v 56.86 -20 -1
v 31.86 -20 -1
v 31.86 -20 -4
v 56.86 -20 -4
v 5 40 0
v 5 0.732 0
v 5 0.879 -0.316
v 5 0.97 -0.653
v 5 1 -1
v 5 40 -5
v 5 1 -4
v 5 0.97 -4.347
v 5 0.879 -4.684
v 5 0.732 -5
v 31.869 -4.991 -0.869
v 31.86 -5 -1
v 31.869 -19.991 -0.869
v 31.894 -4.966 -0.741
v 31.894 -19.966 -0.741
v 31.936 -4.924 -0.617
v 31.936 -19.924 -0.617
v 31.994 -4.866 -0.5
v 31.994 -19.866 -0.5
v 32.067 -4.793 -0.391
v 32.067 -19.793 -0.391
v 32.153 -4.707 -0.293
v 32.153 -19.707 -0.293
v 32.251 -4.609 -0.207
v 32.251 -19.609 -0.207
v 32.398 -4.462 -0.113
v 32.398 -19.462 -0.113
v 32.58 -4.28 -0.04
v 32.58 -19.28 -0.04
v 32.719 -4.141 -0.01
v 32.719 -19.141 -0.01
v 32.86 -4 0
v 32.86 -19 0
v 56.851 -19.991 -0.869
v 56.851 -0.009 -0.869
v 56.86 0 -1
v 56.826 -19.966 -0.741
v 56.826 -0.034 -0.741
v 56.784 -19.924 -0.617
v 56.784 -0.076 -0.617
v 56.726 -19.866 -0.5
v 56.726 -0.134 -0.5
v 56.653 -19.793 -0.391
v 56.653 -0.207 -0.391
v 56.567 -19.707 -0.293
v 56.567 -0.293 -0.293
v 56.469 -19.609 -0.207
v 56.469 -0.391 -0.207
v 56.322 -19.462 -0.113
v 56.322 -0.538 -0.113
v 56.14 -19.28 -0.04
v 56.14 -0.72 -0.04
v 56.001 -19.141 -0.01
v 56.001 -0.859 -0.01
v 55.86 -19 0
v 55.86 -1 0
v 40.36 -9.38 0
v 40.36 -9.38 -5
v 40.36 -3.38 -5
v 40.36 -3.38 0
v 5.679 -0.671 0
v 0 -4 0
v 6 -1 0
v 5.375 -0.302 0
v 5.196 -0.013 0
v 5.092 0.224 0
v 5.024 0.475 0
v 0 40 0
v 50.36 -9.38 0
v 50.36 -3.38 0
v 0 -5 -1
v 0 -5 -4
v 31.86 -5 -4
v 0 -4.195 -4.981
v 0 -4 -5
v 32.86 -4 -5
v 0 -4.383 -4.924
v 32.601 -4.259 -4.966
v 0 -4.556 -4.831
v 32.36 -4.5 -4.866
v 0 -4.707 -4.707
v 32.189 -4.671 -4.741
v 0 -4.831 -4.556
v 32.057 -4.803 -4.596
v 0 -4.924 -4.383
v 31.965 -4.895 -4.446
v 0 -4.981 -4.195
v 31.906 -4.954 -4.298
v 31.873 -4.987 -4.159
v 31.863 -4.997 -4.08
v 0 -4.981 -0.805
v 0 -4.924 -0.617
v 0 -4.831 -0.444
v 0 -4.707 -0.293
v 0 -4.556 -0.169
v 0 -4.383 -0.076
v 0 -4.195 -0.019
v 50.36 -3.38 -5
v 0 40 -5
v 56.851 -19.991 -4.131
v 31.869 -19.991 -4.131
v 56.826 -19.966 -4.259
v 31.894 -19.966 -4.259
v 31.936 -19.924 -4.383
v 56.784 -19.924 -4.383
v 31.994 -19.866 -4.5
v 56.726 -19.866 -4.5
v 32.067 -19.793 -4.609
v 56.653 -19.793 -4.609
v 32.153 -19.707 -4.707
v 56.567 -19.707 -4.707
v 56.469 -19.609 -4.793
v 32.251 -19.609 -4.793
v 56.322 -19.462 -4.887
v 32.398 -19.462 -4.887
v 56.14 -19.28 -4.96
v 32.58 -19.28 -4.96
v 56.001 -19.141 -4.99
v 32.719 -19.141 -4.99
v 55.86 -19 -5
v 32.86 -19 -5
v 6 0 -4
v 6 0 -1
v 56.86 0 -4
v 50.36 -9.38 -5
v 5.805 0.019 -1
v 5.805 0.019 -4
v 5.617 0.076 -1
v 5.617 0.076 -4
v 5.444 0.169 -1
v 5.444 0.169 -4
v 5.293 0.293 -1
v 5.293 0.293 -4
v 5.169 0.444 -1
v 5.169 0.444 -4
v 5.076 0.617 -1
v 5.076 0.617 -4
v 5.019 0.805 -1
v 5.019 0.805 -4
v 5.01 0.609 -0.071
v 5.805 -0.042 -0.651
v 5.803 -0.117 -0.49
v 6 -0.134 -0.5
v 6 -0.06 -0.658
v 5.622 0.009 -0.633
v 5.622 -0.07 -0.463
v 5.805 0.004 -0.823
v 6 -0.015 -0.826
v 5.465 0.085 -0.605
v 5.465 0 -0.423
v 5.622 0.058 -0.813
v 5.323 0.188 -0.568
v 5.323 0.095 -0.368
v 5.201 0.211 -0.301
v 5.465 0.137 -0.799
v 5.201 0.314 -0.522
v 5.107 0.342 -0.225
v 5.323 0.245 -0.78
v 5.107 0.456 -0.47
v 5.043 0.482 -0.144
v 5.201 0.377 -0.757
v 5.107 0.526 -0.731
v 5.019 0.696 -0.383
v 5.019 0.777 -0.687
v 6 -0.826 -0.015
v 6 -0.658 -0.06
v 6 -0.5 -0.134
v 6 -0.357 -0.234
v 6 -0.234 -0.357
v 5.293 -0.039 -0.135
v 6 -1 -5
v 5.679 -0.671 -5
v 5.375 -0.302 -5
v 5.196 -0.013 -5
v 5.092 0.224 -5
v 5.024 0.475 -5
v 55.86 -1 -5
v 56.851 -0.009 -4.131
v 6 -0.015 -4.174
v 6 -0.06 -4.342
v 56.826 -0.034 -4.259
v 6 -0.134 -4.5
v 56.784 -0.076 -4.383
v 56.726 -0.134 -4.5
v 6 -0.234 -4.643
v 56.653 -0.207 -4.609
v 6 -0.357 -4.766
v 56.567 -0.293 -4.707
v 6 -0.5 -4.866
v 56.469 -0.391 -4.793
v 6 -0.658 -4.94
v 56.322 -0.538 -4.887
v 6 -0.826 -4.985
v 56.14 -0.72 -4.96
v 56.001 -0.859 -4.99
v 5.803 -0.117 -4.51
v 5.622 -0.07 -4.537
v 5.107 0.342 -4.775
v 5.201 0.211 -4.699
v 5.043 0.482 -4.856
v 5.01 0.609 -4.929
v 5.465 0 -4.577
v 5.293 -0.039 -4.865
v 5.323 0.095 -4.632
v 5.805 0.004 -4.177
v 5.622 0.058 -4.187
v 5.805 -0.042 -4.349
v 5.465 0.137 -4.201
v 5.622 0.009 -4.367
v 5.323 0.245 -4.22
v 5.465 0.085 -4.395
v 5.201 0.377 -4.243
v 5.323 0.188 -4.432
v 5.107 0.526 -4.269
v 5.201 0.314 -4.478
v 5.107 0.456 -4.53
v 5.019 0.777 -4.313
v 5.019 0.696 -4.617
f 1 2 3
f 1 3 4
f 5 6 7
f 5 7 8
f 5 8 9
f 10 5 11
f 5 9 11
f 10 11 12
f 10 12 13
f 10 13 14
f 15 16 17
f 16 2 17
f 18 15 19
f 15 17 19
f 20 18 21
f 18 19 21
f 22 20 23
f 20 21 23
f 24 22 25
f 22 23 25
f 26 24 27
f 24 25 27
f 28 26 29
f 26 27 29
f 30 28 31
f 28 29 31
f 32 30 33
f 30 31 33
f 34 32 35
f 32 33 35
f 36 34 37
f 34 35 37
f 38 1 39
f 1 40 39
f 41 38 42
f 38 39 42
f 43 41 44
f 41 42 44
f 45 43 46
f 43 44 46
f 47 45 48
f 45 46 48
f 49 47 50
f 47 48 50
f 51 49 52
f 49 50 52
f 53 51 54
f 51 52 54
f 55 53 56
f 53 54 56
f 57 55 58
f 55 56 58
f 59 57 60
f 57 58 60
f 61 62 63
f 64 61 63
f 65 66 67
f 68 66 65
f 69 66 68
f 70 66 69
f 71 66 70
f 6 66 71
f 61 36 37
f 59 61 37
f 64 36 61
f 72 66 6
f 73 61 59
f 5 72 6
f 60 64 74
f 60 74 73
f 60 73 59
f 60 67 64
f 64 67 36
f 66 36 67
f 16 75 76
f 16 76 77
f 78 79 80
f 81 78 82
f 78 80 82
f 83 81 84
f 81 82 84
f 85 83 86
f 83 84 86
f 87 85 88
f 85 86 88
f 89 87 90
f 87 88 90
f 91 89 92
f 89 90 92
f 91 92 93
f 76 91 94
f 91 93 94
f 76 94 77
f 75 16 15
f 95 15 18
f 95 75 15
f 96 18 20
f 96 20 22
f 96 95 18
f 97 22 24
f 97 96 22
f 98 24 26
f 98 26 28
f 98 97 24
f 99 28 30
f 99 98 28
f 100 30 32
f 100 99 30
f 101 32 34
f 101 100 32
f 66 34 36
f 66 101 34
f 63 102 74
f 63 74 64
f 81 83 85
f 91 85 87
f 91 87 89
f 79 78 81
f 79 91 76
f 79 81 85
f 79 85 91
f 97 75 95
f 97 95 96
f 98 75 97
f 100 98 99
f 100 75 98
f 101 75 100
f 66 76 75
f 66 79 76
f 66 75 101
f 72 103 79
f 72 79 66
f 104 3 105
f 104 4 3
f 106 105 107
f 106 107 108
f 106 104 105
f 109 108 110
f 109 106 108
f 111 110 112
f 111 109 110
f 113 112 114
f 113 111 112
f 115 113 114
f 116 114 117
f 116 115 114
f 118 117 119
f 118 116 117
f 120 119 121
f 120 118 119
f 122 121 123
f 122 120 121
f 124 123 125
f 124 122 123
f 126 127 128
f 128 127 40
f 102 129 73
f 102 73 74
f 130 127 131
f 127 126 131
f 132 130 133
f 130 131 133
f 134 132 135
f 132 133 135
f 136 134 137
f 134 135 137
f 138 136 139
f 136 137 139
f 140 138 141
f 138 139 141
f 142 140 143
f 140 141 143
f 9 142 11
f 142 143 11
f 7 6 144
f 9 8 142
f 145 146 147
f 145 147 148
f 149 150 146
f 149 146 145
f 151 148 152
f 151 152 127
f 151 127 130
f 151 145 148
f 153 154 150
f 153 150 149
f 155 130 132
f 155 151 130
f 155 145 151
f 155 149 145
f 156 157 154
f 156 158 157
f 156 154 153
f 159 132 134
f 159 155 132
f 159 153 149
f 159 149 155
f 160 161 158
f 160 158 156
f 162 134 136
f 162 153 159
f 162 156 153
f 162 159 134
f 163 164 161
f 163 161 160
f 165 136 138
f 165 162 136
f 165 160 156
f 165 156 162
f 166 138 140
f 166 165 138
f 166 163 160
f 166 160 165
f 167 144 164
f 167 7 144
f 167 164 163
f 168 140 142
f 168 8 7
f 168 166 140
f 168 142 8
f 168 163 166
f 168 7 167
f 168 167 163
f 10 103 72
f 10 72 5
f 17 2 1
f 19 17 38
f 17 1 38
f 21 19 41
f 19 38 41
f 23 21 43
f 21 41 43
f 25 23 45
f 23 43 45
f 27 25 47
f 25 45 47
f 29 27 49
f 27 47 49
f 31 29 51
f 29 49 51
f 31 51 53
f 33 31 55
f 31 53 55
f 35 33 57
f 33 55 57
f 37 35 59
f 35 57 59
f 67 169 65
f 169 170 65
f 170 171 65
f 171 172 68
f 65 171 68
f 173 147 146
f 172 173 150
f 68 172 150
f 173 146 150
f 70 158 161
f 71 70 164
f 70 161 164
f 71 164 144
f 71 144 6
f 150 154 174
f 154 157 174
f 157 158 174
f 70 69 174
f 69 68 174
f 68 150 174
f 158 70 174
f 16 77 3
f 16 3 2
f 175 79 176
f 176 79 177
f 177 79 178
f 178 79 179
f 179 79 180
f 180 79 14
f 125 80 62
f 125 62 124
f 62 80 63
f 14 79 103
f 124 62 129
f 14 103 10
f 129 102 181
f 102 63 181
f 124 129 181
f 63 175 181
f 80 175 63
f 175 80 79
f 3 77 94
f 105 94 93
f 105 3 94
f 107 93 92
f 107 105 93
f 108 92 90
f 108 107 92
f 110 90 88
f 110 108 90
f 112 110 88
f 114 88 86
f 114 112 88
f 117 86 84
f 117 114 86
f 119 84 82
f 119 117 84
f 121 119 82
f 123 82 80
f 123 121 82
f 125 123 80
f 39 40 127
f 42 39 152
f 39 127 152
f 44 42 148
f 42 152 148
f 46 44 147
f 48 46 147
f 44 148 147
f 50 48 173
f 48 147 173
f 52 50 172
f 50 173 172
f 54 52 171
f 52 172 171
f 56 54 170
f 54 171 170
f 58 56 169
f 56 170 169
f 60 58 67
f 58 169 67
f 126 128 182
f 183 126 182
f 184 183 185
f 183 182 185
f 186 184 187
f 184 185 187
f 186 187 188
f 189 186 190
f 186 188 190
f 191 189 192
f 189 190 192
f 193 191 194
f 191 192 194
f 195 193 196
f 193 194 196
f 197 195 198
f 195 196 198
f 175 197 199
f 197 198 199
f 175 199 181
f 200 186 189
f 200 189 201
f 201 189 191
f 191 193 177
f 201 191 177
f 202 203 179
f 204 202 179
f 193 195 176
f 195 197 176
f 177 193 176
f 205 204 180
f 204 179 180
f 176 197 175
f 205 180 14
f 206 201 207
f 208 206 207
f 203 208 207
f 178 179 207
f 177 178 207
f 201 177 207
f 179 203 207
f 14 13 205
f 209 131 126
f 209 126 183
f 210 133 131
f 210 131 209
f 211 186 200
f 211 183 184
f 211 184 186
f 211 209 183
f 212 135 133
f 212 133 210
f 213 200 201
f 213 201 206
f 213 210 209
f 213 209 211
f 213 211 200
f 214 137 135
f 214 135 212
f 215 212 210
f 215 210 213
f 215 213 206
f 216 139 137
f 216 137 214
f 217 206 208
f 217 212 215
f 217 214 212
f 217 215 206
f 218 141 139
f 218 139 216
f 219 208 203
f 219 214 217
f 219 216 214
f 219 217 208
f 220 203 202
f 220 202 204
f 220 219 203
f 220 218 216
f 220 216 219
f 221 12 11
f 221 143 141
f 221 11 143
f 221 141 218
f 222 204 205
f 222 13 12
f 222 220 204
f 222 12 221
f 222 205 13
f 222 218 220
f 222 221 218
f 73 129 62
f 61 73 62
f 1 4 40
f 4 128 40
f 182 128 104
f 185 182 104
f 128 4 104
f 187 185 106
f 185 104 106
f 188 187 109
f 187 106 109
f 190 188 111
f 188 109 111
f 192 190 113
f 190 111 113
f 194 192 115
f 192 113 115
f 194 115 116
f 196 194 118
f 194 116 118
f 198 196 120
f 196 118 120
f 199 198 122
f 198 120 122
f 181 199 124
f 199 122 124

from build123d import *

# Parameters (mm, degrees)
SKETCH1_W           = 5
SKETCH1_H           = 5
BOSS_EXTRUDE1_DEPTH = 40
SKETCH2_W           = 51.86
SKETCH2_H           = 5
SKETCH2_W_2         = 5
BOSS_EXTRUDE3_DEPTH = 5
SKETCH4_W           = 25
SKETCH4_H           = 5
BOSS_EXTRUDE4_DEPTH = 15
FILLET1_R           = 1
FILLET2_R           = 1
FILLET3_R           = 1
SKETCH5_W           = 10
SKETCH5_H           = 6
CUT_EXTRUDE1_DEPTH  = 70.699782068


with BuildPart() as part:
    # Sketch1 → Boss-Extrude1 (new body)
    with BuildSketch(Plane(origin=(0, 0, 0), x_dir=(1, 0, 0), z_dir=(0, 1, 0))):
        with Locations((2.5, 2.5)):
            Rectangle(SKETCH1_W, SKETCH1_H)
    extrude(amount=BOSS_EXTRUDE1_DEPTH)

    # Sketch2 → Boss-Extrude3 (add)
    with BuildSketch(Plane.XZ):
        with Locations((30.93, -2.5)):
            Rectangle(SKETCH2_W, SKETCH2_H)
        with Locations((2.5, -2.5)):
            Rectangle(SKETCH2_W_2, SKETCH2_H)
    extrude(amount=BOSS_EXTRUDE3_DEPTH)

    # Sketch4 → Boss-Extrude4 (add)
    with BuildSketch(Plane.XZ.offset(5)):
        with Locations((44.36, -2.5)):
            Rectangle(SKETCH4_W, SKETCH4_H)
    extrude(amount=BOSS_EXTRUDE4_DEPTH)

    # Fillet1
    fillet1_edges = [part.edges().sort_by_distance(p)[0] for p in [
        (15.93, -5, 0),
        (56.86, -10, 0),
        (30.93, 0, 0),
        (31.86, -12.5, 0),
        (44.36, -20, 0),
    ]]
    fillet(fillet1_edges, radius=FILLET1_R)

    # Fillet2
    fillet2_edges = [part.edges().sort_by_distance(p)[0] for p in [
        (56.86, -10, -5),
        (30.93, 0, -5),
        (15.93, -5, -5),
        (31.86, -12.5, -5),
        (44.36, -20, -5),
    ]]
    fillet(fillet2_edges, radius=FILLET2_R)

    # Fillet3
    fillet3_edges = [part.edges().sort_by_distance(p)[0] for p in [
        (5, 0, -2.5),
        (5, -0.292893219, -0.292893219),
        (5, -0.292893219, -4.707106781),
    ]]
    fillet(fillet3_edges, radius=FILLET3_R)

    # Sketch5 → Cut-Extrude1 (cut, through all)
    with BuildSketch(Plane(origin=(0, 0, -5), x_dir=(-1, 0, 0), z_dir=(0, 0, -1))):
        with Locations((-45.36, -6.38)):
            Rectangle(SKETCH5_W, SKETCH5_H)
    extrude(amount=-CUT_EXTRUDE1_DEPTH, mode=Mode.SUBTRACT)


solid = part.part
